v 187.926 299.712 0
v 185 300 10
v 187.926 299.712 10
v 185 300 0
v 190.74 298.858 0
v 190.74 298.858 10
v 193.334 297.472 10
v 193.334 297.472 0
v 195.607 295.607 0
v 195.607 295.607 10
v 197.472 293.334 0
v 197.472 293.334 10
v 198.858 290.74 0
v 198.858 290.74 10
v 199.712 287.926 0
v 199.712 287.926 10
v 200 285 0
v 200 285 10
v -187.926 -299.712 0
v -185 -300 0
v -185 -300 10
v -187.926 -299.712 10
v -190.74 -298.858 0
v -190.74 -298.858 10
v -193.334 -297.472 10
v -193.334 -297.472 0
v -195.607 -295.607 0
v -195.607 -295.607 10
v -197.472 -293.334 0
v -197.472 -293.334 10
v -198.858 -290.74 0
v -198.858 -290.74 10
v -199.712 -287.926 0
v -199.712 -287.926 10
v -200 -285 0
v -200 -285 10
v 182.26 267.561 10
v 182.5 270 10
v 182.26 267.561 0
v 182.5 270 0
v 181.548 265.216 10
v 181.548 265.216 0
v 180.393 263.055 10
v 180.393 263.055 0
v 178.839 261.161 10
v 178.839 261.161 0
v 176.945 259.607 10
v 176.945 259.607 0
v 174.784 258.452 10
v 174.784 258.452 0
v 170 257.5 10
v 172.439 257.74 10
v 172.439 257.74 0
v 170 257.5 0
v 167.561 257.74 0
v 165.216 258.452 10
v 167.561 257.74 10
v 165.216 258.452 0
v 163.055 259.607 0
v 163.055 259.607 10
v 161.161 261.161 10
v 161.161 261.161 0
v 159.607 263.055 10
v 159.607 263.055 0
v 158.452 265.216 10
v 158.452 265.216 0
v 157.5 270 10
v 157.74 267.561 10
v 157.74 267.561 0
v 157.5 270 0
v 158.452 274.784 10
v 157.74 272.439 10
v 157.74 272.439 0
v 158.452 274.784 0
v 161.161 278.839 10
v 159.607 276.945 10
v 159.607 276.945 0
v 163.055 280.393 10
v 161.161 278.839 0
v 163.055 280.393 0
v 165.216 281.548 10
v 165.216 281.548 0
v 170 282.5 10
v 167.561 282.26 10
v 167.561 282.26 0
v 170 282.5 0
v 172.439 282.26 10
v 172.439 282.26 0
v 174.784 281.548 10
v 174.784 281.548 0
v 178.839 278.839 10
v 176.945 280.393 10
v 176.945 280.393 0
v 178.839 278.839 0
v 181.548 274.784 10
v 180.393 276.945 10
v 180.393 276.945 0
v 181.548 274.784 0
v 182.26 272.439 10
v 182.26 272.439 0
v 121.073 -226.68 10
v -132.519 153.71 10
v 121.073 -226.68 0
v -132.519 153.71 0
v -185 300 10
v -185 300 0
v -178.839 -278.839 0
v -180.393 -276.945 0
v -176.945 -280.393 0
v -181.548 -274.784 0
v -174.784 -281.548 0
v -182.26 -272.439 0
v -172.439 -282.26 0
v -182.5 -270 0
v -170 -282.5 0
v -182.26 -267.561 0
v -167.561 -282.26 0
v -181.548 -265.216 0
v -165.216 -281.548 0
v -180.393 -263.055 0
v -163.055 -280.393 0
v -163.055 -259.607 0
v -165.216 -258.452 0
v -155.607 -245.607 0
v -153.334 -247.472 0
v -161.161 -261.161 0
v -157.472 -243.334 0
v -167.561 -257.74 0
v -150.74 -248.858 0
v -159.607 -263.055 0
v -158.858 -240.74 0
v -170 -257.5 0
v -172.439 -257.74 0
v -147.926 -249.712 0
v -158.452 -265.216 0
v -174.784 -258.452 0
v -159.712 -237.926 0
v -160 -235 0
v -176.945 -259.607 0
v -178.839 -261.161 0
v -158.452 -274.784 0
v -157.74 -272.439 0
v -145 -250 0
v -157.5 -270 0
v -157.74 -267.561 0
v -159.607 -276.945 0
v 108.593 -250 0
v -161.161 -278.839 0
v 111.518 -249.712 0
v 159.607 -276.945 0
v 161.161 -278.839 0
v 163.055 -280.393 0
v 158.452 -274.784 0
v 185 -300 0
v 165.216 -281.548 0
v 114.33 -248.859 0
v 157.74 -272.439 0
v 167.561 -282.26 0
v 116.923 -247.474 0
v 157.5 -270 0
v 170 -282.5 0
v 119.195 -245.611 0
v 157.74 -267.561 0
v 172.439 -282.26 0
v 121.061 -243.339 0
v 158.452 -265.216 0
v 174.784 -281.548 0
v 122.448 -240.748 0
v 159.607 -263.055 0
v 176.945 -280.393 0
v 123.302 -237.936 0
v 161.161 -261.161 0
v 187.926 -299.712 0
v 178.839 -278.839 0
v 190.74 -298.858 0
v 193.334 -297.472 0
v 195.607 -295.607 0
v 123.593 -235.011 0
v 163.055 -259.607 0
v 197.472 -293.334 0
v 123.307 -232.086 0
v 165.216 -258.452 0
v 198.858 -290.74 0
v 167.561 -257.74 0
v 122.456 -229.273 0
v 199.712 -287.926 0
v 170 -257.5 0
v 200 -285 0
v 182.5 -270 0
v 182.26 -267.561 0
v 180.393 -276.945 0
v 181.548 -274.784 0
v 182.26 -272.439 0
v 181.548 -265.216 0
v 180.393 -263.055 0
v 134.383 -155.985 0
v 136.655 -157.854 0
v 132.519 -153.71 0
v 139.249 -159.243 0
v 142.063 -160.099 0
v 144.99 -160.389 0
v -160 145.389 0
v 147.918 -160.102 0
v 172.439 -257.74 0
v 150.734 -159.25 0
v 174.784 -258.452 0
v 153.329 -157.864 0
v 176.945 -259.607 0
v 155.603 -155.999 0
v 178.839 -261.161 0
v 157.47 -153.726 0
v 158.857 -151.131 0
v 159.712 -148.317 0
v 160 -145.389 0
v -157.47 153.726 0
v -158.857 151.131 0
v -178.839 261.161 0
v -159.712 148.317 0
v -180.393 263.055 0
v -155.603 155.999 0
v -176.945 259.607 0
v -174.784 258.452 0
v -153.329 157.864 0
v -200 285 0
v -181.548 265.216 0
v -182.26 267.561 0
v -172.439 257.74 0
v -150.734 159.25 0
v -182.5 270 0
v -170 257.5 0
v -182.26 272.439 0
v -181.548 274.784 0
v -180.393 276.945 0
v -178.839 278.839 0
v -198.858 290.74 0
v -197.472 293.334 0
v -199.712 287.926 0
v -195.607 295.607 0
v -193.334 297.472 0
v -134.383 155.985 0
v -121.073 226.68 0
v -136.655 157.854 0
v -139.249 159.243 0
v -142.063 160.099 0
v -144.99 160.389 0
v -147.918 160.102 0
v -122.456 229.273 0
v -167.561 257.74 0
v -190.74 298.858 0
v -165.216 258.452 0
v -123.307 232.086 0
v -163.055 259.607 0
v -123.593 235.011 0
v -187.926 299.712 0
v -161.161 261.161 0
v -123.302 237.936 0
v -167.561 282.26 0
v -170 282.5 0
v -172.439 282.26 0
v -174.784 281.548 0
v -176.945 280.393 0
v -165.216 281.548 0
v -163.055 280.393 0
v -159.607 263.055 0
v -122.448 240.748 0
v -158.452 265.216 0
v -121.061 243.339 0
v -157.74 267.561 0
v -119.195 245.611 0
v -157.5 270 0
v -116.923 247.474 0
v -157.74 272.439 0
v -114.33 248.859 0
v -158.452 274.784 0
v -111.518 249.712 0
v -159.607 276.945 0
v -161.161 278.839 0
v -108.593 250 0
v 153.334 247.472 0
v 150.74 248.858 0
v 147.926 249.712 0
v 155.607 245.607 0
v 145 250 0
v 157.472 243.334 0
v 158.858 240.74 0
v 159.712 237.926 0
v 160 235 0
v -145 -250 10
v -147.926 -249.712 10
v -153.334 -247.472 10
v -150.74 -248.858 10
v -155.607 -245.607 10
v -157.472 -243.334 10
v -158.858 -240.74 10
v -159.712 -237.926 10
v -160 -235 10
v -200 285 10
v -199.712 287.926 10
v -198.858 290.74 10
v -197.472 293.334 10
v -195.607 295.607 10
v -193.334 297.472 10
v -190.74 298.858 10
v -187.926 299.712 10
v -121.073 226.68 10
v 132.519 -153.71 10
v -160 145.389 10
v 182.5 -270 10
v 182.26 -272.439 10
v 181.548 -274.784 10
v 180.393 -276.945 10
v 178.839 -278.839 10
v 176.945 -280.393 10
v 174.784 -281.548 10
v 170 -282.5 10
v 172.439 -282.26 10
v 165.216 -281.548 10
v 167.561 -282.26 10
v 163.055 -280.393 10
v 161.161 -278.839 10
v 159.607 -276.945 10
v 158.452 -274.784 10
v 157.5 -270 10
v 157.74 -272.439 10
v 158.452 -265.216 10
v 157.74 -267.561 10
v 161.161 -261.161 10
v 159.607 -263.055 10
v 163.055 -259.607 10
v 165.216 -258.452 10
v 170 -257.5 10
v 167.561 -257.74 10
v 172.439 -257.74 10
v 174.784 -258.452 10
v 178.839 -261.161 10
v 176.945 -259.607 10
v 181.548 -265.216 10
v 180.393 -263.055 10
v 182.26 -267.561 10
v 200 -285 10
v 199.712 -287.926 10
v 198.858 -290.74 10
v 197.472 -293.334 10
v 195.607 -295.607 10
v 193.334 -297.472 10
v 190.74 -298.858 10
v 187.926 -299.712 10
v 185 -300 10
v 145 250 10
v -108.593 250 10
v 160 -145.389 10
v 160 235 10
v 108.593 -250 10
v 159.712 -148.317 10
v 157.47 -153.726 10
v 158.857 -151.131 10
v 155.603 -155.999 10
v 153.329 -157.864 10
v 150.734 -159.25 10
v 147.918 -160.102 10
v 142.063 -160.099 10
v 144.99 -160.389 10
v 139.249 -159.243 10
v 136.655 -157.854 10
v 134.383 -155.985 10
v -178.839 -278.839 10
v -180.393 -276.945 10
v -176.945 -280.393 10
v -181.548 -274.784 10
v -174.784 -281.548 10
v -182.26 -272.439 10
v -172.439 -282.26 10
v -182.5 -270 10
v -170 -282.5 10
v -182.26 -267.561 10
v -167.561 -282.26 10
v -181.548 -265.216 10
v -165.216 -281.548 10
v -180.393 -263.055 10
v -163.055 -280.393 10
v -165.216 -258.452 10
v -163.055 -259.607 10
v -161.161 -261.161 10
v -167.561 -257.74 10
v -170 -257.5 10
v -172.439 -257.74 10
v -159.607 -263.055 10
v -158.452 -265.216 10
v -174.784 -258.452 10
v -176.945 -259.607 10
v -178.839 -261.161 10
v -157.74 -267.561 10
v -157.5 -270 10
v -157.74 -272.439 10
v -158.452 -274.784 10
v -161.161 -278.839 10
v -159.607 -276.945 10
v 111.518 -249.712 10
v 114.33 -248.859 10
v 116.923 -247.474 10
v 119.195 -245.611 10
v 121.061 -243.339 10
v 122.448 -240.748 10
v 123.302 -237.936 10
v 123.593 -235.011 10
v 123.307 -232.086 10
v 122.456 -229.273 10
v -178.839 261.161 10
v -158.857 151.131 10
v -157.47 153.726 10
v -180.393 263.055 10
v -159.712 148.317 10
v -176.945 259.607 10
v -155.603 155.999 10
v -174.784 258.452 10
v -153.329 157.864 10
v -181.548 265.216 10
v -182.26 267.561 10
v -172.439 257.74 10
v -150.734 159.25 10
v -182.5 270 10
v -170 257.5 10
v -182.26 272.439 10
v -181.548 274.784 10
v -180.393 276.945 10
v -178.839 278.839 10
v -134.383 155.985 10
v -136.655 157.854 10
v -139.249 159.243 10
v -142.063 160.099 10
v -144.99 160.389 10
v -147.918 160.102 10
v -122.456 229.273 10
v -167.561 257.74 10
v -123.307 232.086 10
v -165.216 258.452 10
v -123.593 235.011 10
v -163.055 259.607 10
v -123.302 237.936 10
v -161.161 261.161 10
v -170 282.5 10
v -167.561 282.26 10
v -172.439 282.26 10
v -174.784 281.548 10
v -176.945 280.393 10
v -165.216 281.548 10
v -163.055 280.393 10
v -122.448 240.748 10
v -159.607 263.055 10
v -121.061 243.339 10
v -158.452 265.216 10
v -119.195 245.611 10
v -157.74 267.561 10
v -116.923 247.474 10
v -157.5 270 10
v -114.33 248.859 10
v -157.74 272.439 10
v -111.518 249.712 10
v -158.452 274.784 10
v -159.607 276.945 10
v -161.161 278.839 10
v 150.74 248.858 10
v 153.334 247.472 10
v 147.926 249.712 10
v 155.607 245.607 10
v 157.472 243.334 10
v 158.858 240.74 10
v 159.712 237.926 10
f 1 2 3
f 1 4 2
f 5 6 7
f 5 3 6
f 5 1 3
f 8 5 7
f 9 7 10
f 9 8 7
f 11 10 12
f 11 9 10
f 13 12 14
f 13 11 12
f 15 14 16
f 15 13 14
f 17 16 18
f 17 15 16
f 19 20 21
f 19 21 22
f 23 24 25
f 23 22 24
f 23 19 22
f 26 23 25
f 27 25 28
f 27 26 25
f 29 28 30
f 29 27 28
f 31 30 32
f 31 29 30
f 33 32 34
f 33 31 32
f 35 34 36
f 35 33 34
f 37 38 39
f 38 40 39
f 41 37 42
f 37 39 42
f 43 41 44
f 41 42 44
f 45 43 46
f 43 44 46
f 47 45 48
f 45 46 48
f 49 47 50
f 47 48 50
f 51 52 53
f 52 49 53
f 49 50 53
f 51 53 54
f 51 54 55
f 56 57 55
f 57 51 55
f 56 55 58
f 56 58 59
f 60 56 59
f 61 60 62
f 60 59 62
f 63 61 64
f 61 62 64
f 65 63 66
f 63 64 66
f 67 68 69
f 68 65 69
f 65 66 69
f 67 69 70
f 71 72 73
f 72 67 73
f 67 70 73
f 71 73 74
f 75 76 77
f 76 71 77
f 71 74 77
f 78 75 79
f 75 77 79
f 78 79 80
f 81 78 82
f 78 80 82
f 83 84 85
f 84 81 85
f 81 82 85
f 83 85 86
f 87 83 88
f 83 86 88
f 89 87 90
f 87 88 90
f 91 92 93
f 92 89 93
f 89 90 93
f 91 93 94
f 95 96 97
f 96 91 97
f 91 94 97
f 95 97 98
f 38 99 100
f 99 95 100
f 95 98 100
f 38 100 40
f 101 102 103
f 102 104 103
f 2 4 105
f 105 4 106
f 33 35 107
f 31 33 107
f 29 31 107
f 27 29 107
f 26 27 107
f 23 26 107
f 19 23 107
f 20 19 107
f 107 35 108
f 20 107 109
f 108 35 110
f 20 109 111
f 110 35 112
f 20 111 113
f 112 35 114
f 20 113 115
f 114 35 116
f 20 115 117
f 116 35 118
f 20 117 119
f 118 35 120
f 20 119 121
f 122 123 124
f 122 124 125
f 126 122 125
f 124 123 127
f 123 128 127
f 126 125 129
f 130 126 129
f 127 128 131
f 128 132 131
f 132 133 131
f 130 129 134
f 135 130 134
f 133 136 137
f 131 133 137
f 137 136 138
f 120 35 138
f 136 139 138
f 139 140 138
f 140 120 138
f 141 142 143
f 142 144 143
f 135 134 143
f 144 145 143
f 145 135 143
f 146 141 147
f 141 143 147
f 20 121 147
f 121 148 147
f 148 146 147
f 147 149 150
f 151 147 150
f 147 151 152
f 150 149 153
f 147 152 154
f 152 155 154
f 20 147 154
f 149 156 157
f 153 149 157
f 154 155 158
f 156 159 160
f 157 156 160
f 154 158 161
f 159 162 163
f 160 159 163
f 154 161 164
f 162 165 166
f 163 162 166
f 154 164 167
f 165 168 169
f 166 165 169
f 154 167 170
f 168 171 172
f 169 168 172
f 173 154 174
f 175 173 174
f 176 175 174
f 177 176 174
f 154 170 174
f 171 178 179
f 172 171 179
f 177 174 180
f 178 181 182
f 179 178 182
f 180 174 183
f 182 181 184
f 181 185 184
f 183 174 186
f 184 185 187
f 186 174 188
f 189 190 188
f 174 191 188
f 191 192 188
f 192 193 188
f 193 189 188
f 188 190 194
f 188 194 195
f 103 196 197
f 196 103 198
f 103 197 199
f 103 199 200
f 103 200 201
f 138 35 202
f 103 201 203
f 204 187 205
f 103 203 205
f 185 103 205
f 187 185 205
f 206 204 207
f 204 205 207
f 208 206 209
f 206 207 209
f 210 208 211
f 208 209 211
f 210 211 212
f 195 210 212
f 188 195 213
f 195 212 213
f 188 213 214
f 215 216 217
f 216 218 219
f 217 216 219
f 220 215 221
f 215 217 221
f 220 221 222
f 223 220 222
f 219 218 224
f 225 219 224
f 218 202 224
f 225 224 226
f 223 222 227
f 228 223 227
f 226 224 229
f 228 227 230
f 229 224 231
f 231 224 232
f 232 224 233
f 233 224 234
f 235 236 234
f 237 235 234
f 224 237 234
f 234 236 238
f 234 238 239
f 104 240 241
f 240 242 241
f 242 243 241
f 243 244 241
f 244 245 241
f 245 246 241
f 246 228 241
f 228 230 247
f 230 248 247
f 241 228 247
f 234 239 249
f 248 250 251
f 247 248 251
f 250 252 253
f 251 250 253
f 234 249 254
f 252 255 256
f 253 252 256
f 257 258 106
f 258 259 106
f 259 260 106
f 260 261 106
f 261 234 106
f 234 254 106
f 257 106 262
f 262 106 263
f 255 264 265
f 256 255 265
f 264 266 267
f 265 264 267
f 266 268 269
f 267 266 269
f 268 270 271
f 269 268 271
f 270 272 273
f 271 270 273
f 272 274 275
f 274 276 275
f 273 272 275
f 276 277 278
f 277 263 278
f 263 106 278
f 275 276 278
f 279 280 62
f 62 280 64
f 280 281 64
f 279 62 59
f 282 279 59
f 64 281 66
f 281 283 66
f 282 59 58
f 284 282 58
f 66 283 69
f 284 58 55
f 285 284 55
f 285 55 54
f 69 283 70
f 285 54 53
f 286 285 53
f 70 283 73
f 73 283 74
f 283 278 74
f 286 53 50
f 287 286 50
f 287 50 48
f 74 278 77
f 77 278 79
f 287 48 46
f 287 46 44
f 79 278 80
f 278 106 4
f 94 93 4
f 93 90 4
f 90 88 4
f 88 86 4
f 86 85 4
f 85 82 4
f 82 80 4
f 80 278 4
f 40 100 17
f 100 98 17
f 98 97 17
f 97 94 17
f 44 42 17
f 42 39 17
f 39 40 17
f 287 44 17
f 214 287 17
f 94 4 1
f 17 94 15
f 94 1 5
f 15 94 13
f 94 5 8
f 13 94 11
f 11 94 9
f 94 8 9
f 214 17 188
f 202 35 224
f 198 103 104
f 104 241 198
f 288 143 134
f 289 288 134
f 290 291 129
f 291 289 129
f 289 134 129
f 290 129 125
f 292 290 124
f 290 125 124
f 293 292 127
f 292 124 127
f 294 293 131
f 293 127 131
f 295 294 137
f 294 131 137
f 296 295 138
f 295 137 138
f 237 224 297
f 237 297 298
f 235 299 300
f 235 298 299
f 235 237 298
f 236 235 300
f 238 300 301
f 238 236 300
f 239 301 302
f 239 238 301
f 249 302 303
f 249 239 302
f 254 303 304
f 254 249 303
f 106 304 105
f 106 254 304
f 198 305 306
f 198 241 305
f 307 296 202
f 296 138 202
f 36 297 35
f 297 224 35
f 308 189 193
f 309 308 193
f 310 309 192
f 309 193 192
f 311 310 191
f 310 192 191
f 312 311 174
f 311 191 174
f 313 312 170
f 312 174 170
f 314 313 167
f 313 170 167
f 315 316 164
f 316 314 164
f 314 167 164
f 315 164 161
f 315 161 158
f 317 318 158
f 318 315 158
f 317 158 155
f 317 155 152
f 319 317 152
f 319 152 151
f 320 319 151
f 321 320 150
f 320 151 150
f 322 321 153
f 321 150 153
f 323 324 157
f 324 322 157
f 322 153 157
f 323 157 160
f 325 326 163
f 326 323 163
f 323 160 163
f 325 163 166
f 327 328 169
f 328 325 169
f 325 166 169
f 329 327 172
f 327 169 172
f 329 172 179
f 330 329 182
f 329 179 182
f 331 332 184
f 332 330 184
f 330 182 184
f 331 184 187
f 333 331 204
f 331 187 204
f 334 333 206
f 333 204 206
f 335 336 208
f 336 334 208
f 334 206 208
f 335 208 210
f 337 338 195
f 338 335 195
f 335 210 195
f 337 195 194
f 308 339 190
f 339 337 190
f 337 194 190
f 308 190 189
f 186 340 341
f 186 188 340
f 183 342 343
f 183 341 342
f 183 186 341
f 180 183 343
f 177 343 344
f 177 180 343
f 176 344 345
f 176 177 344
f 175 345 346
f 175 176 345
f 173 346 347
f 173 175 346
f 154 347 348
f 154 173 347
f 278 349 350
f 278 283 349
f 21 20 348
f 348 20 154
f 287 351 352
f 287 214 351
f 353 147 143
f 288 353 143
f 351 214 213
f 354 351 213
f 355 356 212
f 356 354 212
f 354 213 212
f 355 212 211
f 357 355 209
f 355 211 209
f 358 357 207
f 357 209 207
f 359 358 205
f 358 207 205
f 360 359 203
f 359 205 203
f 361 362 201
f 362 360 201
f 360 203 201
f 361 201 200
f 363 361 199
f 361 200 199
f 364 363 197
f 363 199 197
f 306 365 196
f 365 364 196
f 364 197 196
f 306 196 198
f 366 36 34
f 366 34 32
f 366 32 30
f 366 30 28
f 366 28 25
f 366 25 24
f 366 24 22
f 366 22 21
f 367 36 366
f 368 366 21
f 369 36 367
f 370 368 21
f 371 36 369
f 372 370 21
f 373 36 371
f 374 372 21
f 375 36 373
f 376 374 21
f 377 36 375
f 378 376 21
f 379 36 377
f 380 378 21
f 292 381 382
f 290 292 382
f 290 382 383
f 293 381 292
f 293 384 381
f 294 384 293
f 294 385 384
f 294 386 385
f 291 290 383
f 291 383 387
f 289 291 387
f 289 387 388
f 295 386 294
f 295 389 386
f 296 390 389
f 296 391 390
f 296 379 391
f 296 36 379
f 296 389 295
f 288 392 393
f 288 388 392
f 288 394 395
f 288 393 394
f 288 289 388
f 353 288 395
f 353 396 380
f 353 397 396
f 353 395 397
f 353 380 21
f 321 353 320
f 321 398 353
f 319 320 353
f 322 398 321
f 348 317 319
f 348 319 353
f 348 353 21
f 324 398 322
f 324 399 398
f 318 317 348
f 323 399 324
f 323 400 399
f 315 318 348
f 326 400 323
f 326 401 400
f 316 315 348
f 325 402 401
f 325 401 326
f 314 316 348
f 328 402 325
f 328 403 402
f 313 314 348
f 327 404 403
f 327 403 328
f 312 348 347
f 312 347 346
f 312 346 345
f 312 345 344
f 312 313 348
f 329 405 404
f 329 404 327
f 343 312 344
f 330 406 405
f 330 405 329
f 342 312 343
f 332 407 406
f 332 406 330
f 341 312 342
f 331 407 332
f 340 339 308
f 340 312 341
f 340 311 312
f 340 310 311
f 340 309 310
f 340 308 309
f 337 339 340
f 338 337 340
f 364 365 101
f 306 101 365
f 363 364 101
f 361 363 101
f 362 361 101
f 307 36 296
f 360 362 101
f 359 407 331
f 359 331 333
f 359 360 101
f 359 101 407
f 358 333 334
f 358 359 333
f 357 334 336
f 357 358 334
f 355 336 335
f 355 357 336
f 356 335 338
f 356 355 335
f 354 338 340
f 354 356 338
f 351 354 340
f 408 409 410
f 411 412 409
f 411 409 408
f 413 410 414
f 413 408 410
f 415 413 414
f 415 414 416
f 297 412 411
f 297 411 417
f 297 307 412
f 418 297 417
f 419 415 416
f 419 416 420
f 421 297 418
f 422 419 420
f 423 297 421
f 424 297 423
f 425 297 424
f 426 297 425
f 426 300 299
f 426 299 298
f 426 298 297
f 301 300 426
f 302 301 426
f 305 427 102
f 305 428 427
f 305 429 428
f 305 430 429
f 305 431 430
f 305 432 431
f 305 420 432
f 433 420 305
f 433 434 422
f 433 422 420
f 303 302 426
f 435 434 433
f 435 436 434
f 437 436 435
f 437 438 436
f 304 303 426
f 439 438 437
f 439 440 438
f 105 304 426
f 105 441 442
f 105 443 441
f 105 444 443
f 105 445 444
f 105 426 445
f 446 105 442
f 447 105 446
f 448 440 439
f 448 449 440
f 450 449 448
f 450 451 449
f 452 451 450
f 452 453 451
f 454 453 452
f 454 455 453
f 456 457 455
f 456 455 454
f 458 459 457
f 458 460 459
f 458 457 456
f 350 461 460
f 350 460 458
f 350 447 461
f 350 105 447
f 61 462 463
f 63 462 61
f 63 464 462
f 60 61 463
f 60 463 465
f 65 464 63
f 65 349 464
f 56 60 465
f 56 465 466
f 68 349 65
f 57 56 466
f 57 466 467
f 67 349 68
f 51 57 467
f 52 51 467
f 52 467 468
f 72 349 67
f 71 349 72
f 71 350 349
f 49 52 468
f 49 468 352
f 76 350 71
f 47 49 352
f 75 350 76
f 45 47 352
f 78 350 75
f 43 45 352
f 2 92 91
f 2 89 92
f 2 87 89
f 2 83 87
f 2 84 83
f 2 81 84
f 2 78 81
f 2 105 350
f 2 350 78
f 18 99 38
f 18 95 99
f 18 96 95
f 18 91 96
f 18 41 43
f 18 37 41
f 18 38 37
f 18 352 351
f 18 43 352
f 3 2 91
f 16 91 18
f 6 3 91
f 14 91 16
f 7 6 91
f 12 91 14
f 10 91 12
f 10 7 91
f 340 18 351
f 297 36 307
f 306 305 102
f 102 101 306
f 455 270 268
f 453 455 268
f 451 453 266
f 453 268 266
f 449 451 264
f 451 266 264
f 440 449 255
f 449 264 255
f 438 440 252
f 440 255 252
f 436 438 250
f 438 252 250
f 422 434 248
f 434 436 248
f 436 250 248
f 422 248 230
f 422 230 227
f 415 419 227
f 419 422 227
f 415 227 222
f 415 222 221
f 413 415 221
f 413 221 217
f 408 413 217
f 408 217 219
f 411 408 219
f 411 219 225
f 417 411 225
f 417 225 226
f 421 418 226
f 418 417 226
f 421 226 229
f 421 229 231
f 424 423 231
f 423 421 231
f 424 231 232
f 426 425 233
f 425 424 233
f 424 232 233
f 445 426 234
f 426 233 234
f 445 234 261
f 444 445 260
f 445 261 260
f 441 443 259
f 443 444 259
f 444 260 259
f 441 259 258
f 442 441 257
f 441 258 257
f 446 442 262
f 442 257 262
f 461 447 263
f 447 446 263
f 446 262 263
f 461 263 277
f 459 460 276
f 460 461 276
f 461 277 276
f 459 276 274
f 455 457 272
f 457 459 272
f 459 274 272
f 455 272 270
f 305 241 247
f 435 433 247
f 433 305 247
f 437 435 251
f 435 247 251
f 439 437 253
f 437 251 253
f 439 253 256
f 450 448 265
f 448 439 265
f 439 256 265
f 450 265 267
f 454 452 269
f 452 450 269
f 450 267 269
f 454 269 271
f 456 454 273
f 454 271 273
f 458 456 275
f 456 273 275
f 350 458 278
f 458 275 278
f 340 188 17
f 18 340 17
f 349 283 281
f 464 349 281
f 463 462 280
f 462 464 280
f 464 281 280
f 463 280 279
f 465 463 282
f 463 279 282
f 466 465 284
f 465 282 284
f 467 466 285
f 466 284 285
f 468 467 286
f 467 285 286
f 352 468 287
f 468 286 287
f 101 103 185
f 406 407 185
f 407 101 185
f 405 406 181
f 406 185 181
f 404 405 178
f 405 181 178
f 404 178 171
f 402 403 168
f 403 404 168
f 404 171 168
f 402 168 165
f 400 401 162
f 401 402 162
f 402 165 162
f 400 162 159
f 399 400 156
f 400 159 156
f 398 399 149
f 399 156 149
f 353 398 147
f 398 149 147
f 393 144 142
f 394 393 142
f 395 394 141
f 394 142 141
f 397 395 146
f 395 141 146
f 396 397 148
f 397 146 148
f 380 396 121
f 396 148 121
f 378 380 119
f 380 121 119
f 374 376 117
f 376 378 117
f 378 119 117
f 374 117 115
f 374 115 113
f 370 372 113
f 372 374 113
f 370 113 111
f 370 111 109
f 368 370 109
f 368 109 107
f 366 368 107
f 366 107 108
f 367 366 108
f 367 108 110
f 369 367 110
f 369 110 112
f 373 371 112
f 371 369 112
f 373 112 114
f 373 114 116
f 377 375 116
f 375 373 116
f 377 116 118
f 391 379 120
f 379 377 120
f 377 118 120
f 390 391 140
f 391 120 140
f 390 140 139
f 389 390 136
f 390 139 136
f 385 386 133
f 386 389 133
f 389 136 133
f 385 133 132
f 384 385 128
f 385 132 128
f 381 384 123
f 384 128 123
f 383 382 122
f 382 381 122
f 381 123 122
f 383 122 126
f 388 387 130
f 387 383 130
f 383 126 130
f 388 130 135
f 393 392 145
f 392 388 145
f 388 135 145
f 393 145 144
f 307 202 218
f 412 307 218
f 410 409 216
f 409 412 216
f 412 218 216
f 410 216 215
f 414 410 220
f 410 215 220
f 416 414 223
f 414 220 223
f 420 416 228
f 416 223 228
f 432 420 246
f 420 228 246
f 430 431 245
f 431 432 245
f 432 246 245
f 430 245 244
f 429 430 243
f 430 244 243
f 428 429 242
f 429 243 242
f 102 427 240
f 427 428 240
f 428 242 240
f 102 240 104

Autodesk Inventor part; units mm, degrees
ref_plane "YZ Plane" through (0, 0, 0) normal (1, 0, 0) x (0, 1, 0)
ref_plane "XZ Plane" through (0, 0, 0) normal (0, 1, 0) x (-1, 0, 0)
ref_plane "XY Plane" through (0, 0, 0) normal (0, 0, 1) x (1, 0, 0)
sketch "Sketch1" plane through (0, 0, 0) normal (0, 0, 1) x (1, 0, 0)
  line L0 (-185, -300) -> (185, -300)
  line L1 (200, -285) -> (200, 285)
  line L2 (185, 300) -> (-185, 300)
  line L3 (-200, 285) -> (-200, -285)
  line L4 (-200, -300) -> (200, 300) construction
  line L5 (200, -300) -> (-200, 300) construction
  arc A0 (-185, 300) -> (-200, 285) centre (-185, 285) ccw
  arc A1 (200, 285) -> (185, 300) centre (185, 285) ccw
  arc A2 (185, -300) -> (200, -285) centre (185, -285) ccw
  arc A3 (-200, -285) -> (-185, -300) centre (-185, -285) ccw
  line L6 (-160, -235) -> (-160, 145.389)
  line L7 (-132.5192, 153.7095) -> (121.0734, -226.6795)
  line L8 (108.5926, -250) -> (-145, -250)
  line L9 (-121.0734, 226.6795) -> (132.5192, -153.7095)
  line L10 (160, -145.389) -> (160, 235)
  line L11 (145, 250) -> (-108.5926, 250)
  arc A4 (-132.5192, 153.7095) -> (-160, 145.389) centre (-145, 145.389) ccw
  arc A5 (-108.5926, 250) -> (-121.0734, 226.6795) centre (-108.5926, 235) ccw
  arc A6 (108.5926, -250) -> (121.0734, -226.6795) centre (108.5926, -235) ccw
  arc A7 (132.5192, -153.7095) -> (160, -145.389) centre (145, -145.389) ccw
  arc A8 (160, 235) -> (145, 250) centre (145, 235) ccw
  arc A9 (-160, -235) -> (-145, -250) centre (-145, -235) ccw
  circle A10 centre (-170, 270) radius 12.5
  line L12 (0, -424.3492) -> (0, 424.3492) projected
  line L13 (-284.3492, 0) -> (284.3492, 0) projected
  circle A11 centre (170, 270) radius 12.5
  circle A12 centre (-170, -270) radius 12.5
  circle A13 centre (170, -270) radius 12.5
  point P0 (0, 0)
  dimension "width" = 400
  dimension "depth" = 600
  dimension "outerCornnerRadius" = 15
  dimension "d5" = 15
  dimension "d7" = 50
  dimension "d8" = 50
  dimension "innerCorrerRadius" = 15
  dimension "d14" = 40
  dimension "d15" = 40
  dimension "d16" = 40
  dimension "d17" = 40
  dimension "d20" = 25
  dimension "d21" = 30
  dimension "d22" = 30
extrude "Extrusion3" add sketch "Sketch1" along normal blind 10 contours A3 L3 L13 L6 A9 L8 L12 L0 | L12 L8 A6 L7 L13 L9 A7 L10 L1 A2 L0 | L3 A0 L2 L12 L11 A5 L9 L13 L7 A4 L6 | L7 L13 L12 | L13 L10 A8 L11 L12 L2 A1 L1 | L12 L9 L13
equation "\"d5\" = outerCornnerRadius"
equation "\"d15\" = d14"
properties part number "pompression_plate"
